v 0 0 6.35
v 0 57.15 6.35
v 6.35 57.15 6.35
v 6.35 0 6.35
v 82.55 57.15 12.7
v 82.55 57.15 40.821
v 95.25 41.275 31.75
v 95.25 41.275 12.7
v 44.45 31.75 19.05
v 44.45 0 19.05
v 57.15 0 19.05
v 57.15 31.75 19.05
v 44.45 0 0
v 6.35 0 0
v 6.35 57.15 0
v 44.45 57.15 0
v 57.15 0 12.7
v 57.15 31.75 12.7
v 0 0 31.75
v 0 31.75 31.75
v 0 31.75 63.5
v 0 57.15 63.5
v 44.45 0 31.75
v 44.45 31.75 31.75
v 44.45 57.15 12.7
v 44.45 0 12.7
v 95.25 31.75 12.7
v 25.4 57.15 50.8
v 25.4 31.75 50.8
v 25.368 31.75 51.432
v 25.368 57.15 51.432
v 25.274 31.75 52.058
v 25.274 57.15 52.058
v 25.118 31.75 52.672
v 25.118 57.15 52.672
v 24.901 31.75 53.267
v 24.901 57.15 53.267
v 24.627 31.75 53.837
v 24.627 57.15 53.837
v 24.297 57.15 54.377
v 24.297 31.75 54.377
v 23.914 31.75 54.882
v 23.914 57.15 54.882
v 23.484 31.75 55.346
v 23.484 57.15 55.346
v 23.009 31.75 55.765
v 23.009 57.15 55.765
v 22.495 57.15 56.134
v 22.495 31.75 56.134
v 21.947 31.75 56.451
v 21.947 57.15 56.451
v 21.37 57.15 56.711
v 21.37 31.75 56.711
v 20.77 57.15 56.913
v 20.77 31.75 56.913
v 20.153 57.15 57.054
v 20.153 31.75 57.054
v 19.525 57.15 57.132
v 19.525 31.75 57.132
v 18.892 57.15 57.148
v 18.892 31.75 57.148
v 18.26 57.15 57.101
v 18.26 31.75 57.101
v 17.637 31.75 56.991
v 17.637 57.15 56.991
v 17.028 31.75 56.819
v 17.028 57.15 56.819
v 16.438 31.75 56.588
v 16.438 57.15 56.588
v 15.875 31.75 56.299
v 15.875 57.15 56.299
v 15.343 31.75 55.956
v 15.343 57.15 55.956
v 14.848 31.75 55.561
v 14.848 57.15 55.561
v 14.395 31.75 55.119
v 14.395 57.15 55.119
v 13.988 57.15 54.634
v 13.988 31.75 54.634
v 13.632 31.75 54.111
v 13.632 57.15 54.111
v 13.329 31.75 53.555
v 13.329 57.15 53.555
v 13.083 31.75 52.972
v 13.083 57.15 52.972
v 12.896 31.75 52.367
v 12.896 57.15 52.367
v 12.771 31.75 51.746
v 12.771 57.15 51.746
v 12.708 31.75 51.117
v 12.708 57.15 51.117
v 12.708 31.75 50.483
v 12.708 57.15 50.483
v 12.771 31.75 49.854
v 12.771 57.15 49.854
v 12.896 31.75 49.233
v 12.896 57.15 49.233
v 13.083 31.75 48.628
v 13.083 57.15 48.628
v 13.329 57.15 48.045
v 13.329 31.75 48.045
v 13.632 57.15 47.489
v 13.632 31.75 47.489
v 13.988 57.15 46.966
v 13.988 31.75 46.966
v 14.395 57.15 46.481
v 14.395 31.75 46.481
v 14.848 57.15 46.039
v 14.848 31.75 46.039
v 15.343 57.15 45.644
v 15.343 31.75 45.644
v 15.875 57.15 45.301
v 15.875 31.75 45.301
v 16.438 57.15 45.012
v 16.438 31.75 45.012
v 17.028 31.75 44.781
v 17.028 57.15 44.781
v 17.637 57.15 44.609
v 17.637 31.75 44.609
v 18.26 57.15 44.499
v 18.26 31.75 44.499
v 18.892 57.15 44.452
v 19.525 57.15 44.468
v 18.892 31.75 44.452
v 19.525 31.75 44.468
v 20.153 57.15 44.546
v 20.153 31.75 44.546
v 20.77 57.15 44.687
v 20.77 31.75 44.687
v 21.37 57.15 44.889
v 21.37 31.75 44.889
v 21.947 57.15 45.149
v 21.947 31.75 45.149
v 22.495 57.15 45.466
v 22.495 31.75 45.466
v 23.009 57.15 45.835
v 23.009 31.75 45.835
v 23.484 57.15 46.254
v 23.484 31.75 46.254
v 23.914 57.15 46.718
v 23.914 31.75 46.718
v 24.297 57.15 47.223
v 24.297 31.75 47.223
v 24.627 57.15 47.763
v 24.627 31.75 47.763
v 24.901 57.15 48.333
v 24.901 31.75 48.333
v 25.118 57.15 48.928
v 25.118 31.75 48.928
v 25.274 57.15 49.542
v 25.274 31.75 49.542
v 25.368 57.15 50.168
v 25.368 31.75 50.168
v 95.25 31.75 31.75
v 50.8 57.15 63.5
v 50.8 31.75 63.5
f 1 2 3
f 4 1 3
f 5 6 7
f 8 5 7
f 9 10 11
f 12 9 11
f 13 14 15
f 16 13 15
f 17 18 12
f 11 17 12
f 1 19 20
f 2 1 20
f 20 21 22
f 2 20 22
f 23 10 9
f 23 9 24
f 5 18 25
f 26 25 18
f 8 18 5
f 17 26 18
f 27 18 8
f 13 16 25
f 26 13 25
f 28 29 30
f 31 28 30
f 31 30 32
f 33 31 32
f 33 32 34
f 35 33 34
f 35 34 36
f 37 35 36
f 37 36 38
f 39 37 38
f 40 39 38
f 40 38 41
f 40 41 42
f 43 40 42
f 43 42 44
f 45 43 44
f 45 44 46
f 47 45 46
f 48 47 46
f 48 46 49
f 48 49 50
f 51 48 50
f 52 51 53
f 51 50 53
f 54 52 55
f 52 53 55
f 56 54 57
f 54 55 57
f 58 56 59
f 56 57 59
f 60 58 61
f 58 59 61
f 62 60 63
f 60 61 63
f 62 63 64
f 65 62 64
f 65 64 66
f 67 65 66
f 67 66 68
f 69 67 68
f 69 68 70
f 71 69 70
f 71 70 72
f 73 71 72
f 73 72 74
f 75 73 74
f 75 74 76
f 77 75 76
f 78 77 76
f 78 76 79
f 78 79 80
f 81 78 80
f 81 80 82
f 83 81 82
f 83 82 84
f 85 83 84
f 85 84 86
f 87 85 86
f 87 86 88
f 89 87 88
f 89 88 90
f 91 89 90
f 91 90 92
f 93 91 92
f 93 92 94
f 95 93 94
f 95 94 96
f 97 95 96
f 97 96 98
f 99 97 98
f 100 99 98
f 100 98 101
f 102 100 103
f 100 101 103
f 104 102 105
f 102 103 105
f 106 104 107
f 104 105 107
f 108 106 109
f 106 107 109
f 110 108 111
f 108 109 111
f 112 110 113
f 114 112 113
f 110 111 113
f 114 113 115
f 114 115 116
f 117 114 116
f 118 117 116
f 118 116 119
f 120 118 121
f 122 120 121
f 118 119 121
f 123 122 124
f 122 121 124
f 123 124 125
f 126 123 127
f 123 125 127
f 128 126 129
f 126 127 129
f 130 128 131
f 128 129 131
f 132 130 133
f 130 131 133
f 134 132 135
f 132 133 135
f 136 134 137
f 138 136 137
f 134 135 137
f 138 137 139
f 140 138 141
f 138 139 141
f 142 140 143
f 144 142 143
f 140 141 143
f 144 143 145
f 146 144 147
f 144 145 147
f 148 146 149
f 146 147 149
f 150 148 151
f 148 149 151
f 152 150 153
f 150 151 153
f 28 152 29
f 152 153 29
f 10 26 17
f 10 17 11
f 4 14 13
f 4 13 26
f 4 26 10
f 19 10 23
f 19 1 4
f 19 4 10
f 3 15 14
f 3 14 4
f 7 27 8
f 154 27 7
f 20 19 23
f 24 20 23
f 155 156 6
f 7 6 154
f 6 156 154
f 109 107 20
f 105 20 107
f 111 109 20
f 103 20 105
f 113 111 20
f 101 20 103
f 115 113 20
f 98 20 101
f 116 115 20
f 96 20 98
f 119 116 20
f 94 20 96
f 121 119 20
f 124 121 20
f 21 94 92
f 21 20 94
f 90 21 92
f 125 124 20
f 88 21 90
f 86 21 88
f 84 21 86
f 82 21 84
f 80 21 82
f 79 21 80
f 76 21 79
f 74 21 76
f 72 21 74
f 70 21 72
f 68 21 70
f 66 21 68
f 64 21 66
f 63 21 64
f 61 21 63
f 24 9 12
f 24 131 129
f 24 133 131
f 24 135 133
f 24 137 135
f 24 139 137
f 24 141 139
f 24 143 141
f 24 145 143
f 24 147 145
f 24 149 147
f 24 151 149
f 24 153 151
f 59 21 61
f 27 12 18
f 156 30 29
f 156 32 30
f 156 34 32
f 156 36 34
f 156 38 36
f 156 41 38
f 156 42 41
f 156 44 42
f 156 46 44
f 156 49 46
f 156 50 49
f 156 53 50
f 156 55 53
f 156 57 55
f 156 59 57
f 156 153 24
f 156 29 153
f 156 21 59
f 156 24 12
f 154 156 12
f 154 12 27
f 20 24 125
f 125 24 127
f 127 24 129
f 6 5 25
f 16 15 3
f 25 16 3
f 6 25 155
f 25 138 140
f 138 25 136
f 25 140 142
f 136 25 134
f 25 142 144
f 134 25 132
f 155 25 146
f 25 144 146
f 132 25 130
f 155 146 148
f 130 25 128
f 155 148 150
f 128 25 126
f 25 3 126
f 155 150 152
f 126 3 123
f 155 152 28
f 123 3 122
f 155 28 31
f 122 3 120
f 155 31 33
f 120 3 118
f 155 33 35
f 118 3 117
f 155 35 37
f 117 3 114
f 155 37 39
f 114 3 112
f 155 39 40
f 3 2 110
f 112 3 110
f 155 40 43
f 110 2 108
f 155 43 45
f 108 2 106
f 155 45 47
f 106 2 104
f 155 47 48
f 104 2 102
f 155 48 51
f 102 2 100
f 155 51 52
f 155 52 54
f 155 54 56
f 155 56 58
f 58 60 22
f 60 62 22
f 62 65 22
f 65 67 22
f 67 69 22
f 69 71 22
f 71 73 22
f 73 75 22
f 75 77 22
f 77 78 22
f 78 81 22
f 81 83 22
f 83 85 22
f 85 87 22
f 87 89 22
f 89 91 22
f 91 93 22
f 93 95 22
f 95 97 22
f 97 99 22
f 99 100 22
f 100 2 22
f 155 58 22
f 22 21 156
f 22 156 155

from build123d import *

# Parameters (mm, degrees)
F0_W      = 57.15
F0_H      = 63.5
F1_DEPTH  = 107.95
F2_W      = 6.35
F2_H      = 6.35
F3_DEPTH  = 57.151
F4_W      = 107.95
F4_H      = 31.75
F5_DEPTH  = 31.75
F6_W      = 63.5
F6_H      = 12.7
F7_DEPTH  = 31.75
F8_W      = 63.5
F8_H      = 12.7
F9_DEPTH  = 57.151
F10_W     = 50.8
F10_H     = 6.35
F11_DEPTH = 31.75
F12_W     = 12.7
F12_H     = 50.8
F13_DEPTH = 25.401
F15_DEPTH = 63.501
F17_DEPTH = 25.401
F18_R     = 6.35
F19_DEPTH = 25.401


with BuildPart() as f1:
    # F0 (on Right) → F1 (new body)
    with BuildSketch(Plane.YZ):
        with Locations((28.575, 31.75)):
            Rectangle(F0_W, F0_H)
    extrude(amount=F1_DEPTH)

    # F2 (on face) → F3 (cut, through all)
    with BuildSketch(Plane.XZ):
        with Locations((3.175, 3.175)):
            Rectangle(F2_W, F2_H)
    extrude(amount=-F3_DEPTH, mode=Mode.SUBTRACT)

    # F4 (on face) → F5 (cut)
    with BuildSketch(Plane.XZ):
        with Locations((53.975, 47.625)):
            Rectangle(F4_W, F4_H)
    extrude(amount=-F5_DEPTH, mode=Mode.SUBTRACT)

    # F6 (on face) → F7 (cut)
    with BuildSketch(Plane.XZ):
        with Locations((76.2, 25.4)):
            Rectangle(F6_W, F6_H)
    extrude(amount=-F7_DEPTH, mode=Mode.SUBTRACT)

    # F8 (on face) → F9 (cut, through all)
    with BuildSketch(Plane.XZ):
        with Locations((76.2, 6.35)):
            Rectangle(F8_W, F8_H)
    extrude(amount=-F9_DEPTH, mode=Mode.SUBTRACT)

    # F10 (on face) → F11 (cut)
    with BuildSketch(Plane.XZ):
        with Locations((82.55, 15.875)):
            Rectangle(F10_W, F10_H)
    extrude(amount=-F11_DEPTH, mode=Mode.SUBTRACT)

    # F12 (on face) → F13 (cut, through all)
    with BuildSketch(Plane.XZ.offset(-31.75)):
        with Locations((101.6, 38.1)):
            Rectangle(F12_W, F12_H)
    extrude(amount=-F13_DEPTH, mode=Mode.SUBTRACT)

    # F14 (on face) → F15 (cut, through all)
    with BuildSketch(Plane.XY.offset(63.5)):
        Polygon((82.55, 57.15), (95.25, 41.275), (95.25, 57.15), align=None)
    extrude(amount=-F15_DEPTH, mode=Mode.SUBTRACT)

    # F16 (on face) → F17 (cut, through all)
    with BuildSketch(Plane.XZ.offset(-31.75)):
        Polygon((95.25, 63.5), (50.8, 63.5), (95.25, 31.75), align=None)
    extrude(amount=-F17_DEPTH, mode=Mode.SUBTRACT)

    # F18 (on face) → F19 (cut, through all)
    with BuildSketch(Plane.XZ.offset(-31.75)):
        with Locations((19.05, 50.8)):
            Circle(F18_R)
    extrude(amount=-F19_DEPTH, mode=Mode.SUBTRACT)


solid = f1.part
